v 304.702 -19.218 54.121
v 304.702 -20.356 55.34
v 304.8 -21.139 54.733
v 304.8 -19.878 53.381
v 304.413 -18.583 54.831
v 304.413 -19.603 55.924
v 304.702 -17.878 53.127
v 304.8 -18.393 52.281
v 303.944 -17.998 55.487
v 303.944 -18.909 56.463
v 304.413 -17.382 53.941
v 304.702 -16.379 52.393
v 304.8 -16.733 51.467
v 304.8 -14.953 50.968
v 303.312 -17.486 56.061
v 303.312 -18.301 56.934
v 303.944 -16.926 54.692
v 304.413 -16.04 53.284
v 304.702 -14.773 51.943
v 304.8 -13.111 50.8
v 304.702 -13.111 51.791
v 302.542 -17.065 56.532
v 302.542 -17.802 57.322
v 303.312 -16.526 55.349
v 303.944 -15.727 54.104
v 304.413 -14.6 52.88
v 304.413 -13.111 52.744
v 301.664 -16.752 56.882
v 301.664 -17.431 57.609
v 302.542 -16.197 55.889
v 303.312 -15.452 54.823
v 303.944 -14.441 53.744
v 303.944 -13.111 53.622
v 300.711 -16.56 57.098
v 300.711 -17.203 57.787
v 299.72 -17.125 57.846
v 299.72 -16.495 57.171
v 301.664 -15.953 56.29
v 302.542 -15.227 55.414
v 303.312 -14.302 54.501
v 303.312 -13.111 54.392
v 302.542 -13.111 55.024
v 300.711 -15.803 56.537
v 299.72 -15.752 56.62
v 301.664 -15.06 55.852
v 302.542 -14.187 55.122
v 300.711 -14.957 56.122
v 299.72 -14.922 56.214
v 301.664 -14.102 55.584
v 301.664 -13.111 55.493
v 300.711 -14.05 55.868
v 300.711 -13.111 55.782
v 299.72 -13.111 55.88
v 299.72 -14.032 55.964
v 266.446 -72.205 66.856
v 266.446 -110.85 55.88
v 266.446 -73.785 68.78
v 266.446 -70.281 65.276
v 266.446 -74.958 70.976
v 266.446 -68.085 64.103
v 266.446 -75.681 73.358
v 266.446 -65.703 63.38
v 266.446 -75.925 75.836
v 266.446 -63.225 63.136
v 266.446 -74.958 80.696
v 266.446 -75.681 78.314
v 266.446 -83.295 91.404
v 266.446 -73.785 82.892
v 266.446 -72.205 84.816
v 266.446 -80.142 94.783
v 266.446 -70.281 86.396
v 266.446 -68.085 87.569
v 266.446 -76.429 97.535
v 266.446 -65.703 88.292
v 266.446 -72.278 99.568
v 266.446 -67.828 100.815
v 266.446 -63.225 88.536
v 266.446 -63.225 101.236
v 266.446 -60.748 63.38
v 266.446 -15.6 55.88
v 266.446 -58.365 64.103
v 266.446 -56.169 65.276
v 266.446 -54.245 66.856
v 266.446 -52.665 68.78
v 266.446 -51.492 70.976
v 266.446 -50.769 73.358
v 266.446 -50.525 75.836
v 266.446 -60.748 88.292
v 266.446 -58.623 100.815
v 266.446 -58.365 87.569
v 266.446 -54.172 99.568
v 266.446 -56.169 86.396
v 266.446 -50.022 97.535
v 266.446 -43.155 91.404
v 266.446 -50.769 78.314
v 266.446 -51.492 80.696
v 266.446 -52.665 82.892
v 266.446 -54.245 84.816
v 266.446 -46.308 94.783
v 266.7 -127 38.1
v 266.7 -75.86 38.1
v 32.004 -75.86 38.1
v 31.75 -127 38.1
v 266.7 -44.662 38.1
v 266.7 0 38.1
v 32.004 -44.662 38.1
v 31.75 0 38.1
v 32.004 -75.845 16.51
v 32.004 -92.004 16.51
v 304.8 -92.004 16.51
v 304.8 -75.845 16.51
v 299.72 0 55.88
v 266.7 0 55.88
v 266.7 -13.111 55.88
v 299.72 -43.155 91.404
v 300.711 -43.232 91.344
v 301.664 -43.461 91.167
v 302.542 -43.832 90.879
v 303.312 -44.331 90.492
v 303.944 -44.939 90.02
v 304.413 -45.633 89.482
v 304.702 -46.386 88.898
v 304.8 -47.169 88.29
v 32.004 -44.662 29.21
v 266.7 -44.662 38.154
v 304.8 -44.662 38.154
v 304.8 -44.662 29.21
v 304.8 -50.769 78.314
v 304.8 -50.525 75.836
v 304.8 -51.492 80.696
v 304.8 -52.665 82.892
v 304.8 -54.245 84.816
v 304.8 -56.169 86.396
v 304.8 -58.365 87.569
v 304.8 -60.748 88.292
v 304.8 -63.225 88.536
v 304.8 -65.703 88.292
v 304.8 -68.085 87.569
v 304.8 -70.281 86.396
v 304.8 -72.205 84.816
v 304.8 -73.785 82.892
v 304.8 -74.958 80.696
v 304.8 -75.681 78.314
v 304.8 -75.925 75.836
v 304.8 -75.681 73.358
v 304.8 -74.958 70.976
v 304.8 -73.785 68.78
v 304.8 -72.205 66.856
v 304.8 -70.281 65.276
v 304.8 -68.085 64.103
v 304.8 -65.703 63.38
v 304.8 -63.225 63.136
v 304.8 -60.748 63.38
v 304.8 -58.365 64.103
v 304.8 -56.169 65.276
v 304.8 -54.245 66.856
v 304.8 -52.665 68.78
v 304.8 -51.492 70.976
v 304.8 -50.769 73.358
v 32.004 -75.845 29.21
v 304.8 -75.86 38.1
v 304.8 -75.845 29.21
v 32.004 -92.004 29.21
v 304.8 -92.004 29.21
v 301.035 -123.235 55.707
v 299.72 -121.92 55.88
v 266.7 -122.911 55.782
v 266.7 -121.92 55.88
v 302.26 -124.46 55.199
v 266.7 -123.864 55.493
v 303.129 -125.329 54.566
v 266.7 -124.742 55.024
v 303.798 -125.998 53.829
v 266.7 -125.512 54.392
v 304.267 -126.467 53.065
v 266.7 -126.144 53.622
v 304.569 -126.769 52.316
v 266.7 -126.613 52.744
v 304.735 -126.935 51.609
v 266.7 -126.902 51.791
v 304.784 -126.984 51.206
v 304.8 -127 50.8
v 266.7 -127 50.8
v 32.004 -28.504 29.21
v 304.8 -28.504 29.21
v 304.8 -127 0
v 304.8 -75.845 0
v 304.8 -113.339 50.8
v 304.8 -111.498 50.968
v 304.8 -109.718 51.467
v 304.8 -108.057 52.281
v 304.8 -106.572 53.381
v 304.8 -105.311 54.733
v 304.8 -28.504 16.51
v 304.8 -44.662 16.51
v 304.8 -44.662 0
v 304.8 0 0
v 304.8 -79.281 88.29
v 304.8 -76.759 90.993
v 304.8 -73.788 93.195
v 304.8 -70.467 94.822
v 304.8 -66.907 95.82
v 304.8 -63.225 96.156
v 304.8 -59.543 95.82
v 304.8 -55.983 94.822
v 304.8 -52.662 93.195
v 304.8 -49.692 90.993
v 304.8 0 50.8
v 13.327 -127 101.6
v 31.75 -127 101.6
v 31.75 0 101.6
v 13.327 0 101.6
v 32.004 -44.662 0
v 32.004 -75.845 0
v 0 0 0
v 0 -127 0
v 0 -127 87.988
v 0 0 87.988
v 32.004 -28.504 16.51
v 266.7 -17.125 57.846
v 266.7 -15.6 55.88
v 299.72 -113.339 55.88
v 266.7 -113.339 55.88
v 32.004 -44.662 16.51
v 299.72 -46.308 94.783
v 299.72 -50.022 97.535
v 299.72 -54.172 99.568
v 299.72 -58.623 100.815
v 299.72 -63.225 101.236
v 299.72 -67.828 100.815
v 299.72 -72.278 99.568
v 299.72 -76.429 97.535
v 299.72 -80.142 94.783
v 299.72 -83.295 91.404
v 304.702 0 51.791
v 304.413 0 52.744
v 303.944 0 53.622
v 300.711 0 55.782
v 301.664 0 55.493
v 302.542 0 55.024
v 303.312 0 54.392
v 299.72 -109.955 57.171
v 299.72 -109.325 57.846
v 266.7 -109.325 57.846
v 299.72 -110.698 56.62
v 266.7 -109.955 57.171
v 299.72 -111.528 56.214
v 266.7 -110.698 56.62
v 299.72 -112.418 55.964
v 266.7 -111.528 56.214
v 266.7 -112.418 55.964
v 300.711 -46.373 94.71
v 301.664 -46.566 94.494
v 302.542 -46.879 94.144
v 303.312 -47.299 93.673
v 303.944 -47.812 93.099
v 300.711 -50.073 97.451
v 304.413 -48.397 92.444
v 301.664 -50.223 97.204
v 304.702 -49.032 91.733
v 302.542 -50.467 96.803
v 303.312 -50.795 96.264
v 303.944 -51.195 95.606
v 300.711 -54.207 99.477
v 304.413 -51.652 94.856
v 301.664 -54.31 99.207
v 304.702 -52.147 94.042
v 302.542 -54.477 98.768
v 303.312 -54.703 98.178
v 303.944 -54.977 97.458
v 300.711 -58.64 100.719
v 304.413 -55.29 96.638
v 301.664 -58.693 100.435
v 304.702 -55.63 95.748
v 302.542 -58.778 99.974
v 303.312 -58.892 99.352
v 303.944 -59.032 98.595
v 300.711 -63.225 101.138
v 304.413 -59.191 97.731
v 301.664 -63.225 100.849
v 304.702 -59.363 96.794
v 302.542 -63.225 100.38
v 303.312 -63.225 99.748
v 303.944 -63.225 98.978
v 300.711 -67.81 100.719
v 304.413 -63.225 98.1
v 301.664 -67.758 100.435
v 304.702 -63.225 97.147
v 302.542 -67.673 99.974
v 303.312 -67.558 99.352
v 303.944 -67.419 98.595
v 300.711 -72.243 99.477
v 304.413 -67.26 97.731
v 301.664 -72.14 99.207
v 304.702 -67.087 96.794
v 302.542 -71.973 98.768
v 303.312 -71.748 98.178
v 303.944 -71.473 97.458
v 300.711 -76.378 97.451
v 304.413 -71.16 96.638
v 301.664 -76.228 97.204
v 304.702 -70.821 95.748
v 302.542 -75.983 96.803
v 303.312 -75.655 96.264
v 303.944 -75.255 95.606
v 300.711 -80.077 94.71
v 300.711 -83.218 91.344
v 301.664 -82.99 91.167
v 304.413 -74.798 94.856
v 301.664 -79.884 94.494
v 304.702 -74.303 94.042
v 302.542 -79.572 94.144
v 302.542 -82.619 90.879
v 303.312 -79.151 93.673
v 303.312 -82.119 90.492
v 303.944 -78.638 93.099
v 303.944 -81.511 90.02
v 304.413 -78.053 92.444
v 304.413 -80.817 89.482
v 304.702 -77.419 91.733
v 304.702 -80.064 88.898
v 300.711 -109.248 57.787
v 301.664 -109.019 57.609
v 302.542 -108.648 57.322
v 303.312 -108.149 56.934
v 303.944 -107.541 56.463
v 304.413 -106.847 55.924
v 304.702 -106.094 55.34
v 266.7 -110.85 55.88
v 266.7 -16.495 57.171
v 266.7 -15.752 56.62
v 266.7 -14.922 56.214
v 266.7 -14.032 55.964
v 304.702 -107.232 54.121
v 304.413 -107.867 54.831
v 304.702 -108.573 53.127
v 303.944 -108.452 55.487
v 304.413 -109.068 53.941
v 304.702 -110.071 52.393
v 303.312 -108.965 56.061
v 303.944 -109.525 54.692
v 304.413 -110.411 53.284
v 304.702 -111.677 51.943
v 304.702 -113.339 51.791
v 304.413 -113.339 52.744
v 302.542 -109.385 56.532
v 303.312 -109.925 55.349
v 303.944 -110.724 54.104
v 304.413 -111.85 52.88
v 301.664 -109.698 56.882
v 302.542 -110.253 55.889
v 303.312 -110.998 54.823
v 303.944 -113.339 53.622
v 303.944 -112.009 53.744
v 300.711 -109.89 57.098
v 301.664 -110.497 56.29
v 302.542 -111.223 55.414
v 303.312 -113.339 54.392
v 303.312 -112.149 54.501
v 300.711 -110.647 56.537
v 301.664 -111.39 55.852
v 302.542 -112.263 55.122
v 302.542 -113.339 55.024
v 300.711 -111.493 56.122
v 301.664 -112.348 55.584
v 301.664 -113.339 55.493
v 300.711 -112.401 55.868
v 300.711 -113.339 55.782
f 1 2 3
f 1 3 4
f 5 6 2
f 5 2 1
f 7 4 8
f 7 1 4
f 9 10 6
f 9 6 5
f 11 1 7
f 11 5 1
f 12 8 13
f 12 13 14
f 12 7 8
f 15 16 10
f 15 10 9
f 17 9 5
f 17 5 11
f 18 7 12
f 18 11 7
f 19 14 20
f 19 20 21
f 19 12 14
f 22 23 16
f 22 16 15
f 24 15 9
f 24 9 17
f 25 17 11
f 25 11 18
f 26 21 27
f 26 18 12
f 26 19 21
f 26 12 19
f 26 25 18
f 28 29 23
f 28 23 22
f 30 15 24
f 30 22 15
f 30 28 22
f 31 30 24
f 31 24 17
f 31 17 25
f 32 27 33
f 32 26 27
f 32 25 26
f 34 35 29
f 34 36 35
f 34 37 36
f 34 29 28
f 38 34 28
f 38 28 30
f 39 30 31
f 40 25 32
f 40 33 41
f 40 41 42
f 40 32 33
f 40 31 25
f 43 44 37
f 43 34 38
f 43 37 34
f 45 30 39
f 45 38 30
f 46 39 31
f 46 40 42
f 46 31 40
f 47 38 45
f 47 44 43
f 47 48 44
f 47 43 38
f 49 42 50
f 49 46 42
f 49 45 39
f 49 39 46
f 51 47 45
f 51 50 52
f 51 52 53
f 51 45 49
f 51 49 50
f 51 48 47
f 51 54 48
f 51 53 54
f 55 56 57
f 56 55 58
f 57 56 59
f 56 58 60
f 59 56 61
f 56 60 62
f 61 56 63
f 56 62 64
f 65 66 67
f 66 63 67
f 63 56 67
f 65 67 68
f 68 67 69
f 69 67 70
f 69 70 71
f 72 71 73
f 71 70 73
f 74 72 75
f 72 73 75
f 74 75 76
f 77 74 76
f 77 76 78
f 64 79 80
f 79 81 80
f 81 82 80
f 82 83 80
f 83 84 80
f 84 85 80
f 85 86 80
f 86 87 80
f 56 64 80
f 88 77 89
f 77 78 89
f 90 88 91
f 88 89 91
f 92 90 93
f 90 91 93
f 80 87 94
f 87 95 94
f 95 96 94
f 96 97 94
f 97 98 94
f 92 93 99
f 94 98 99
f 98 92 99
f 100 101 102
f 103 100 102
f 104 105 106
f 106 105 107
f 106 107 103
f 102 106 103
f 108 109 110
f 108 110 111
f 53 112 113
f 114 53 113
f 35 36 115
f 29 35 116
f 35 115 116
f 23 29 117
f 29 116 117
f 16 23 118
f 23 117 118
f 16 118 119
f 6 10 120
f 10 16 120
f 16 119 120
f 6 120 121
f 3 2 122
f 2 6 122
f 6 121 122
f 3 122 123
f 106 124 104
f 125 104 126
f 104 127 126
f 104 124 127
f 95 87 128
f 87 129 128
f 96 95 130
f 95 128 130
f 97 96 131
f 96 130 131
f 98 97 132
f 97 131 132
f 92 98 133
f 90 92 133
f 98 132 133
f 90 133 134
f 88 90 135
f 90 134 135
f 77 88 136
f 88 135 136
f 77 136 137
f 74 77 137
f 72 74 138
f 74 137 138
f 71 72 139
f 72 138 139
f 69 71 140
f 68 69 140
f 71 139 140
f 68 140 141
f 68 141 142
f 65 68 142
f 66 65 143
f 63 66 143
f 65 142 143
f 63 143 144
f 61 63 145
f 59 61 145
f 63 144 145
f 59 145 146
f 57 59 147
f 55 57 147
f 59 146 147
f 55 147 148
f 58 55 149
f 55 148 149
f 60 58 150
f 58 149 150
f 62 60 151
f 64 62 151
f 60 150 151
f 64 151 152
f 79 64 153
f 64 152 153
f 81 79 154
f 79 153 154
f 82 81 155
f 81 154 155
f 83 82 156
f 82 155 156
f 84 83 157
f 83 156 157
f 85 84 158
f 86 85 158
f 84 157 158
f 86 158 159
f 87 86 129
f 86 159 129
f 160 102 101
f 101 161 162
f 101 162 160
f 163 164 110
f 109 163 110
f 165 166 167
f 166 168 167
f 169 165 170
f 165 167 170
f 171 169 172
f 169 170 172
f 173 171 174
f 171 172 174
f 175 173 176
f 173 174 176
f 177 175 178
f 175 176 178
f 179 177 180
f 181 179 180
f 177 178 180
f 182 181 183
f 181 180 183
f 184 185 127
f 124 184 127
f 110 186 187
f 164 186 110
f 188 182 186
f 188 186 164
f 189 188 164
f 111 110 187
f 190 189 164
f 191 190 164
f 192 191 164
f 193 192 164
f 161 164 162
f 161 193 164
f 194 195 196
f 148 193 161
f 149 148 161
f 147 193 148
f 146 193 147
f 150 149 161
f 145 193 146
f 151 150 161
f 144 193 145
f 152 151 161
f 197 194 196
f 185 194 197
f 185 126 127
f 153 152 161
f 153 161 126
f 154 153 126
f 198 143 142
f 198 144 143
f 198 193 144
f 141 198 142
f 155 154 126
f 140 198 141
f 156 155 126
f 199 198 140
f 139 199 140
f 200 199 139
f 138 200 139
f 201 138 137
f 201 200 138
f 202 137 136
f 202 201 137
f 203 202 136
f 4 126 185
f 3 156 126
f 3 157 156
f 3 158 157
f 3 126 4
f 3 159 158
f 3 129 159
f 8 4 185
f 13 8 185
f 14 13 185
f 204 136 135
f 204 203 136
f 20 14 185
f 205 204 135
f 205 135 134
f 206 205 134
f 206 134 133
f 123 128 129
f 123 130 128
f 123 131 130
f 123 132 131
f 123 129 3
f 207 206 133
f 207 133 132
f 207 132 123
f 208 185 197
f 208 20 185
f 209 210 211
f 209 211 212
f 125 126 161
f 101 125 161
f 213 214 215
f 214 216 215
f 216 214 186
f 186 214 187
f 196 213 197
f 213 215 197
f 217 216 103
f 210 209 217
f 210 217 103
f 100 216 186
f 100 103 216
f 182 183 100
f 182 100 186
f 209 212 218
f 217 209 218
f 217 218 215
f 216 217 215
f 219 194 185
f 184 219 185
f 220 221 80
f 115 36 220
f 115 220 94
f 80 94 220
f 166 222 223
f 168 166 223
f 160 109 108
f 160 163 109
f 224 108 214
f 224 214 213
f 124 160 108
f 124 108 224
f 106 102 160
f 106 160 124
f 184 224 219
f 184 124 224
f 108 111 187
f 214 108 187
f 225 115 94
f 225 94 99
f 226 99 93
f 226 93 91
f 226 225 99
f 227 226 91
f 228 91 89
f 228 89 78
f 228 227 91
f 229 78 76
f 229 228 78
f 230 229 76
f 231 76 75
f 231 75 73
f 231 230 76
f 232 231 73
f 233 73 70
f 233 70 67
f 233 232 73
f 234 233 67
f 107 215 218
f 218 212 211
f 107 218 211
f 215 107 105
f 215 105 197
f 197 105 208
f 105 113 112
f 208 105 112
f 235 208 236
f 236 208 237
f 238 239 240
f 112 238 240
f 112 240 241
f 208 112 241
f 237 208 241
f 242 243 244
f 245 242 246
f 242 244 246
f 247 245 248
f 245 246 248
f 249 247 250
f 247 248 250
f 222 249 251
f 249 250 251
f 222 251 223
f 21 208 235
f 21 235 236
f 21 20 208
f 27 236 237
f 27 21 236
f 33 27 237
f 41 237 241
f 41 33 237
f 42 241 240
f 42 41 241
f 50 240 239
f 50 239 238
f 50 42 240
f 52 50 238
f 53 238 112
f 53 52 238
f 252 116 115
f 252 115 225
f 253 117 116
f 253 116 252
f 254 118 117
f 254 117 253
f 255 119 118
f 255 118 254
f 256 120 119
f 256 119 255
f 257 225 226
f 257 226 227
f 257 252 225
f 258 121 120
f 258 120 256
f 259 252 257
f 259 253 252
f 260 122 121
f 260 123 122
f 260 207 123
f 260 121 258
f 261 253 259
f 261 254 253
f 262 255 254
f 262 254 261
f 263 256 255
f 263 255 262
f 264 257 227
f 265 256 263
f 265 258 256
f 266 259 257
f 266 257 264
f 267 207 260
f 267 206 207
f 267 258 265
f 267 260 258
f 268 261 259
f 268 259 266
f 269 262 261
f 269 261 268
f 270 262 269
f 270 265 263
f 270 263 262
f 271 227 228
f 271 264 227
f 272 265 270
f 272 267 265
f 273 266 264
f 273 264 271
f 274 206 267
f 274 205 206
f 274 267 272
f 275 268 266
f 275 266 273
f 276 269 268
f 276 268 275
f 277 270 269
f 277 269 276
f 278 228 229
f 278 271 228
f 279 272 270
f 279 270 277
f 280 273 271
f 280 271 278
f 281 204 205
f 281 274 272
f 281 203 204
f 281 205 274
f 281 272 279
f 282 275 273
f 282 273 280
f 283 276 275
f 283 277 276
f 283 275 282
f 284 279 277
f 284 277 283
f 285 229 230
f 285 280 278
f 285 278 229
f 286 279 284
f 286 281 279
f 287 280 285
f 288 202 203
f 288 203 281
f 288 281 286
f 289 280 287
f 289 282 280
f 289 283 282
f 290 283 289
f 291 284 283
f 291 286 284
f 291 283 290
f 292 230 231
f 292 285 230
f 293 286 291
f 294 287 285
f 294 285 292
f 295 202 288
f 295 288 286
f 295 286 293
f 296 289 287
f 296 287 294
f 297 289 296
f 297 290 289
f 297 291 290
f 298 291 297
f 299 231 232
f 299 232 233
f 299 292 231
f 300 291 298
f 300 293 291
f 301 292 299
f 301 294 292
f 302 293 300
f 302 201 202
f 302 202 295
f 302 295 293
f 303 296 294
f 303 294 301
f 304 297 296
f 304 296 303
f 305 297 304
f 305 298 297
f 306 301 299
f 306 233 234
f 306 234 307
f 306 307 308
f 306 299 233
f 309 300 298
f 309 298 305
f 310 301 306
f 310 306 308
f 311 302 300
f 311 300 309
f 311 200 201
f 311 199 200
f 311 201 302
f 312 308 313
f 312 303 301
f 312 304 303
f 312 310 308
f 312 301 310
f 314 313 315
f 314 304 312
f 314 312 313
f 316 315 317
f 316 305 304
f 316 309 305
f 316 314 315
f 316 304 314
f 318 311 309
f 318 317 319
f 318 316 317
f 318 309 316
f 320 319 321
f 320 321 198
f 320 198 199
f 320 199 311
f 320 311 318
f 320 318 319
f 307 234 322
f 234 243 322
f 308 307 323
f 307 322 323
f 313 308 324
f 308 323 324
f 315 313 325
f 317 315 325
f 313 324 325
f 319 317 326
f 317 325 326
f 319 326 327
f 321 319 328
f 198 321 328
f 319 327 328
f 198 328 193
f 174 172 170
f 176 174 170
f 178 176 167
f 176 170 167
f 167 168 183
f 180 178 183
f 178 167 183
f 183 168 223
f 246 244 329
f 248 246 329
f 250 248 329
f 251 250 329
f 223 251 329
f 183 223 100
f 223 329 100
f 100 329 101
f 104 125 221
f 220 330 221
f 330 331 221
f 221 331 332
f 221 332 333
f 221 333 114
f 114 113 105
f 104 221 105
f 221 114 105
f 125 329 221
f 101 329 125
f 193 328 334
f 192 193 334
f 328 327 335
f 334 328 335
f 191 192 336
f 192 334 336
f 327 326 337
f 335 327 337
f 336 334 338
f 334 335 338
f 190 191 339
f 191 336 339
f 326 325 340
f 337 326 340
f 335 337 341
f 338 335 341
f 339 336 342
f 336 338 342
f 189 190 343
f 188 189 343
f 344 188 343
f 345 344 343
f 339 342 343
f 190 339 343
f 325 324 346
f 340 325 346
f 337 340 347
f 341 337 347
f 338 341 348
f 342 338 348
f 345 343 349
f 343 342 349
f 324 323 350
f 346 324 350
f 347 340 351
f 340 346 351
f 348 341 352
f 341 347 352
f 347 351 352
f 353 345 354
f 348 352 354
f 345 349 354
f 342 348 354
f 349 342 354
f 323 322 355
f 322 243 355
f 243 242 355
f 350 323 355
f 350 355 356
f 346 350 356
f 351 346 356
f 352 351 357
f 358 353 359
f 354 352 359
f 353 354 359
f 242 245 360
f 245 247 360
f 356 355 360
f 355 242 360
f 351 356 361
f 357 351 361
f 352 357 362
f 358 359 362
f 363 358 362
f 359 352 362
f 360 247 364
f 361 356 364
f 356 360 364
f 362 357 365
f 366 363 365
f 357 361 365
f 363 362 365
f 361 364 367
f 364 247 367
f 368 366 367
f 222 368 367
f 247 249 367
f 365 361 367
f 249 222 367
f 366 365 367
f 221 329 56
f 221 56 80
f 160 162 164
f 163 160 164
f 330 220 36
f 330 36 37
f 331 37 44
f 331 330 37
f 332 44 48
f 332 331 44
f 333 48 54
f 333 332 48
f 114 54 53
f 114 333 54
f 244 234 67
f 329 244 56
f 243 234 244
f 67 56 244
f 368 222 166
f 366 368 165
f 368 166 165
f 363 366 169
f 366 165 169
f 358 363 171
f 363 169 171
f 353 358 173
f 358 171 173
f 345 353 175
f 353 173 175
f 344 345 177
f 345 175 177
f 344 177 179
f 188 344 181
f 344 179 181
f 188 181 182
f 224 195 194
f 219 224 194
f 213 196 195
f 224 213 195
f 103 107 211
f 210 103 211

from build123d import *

# Parameters (mm, degrees)
F1_DEPTH = 127
F3_DEPTH = 38.354
F4_R     = 12.7
F5_DEPTH = 63.5
F7_DEPTH = 272.796
F8_R     = 5.08


with BuildPart() as f1:
    # F0 (on Front) → F1 (new body)
    with BuildSketch(Plane.XZ):
        Polygon((0, 87.987836793), (0, 0), (304.8, 0), (304.8, 55.88), (266.7, 55.88), (266.7, 38.1), (31.75, 38.1), (31.75, 101.6), (13.3270969392, 101.6), align=None)
    extrude(amount=F1_DEPTH)

    # F2 (on face) → F3 (join)
    with BuildSketch(Plane.YZ.offset(304.8)):
        with BuildLine():
            Line((-83.2950948956, 91.4038064892), (-110.8501477266, 55.88))
            Line((-110.8501477266, 55.88), (-15.6001477266, 55.88))
            Line((-15.6001477266, 55.88), (-43.1552005575, 91.4038064892))
            ThreePointArc((-43.1552005575, 91.4038064892), (-63.2251477266, 101.2359800311), (-83.2950948956, 91.4038064892))
        make_face()
    extrude(amount=-F3_DEPTH)

    # F4 (on face) → F5 (cut, symmetric)
    with BuildSketch(Plane.YZ.offset(304.8)):
        with Locations((-63.2251477266, 75.8359800311)):
            Circle(F4_R)
    extrude(amount=F5_DEPTH, both=True, mode=Mode.SUBTRACT)

    # F6 (on face) → F7 (cut)
    with BuildSketch(Plane.YZ.offset(304.8)):
        Polygon((-75.8447764756, 16.51), (-75.8447764756, 0), (-44.662312481, 0), (-44.662312481, 16.51), (-28.5035444783, 16.51), (-28.5035444783, 29.21), (-44.662312481, 29.21), (-44.662312481, 38.1537896351), (-75.8601041585, 38.1), (-75.8447764756, 29.21), (-92.0035444783, 29.21), (-92.0035444783, 16.51), align=None)
    extrude(amount=-F7_DEPTH, mode=Mode.SUBTRACT)

    # F8
    f8_edges = [f1.edges().sort_by_distance(p)[0] for p in [
        (304.8, -97.072621, 73.641903),
        (304.8, -7.800074, 55.88),
        (304.8, -118.925074, 55.88),
        (285.75, -127, 55.88),
        (285.623, -83.295095, 91.403806),
        (285.623, -43.155201, 91.403806),
        (304.8, -29.377674, 73.641903),
        (304.8, -63.225148, 101.23598),
        (285.75, -15.600148, 55.88),
        (285.75, -110.850148, 55.88),
    ]]
    fillet(f8_edges, radius=F8_R)


solid = f1.part
